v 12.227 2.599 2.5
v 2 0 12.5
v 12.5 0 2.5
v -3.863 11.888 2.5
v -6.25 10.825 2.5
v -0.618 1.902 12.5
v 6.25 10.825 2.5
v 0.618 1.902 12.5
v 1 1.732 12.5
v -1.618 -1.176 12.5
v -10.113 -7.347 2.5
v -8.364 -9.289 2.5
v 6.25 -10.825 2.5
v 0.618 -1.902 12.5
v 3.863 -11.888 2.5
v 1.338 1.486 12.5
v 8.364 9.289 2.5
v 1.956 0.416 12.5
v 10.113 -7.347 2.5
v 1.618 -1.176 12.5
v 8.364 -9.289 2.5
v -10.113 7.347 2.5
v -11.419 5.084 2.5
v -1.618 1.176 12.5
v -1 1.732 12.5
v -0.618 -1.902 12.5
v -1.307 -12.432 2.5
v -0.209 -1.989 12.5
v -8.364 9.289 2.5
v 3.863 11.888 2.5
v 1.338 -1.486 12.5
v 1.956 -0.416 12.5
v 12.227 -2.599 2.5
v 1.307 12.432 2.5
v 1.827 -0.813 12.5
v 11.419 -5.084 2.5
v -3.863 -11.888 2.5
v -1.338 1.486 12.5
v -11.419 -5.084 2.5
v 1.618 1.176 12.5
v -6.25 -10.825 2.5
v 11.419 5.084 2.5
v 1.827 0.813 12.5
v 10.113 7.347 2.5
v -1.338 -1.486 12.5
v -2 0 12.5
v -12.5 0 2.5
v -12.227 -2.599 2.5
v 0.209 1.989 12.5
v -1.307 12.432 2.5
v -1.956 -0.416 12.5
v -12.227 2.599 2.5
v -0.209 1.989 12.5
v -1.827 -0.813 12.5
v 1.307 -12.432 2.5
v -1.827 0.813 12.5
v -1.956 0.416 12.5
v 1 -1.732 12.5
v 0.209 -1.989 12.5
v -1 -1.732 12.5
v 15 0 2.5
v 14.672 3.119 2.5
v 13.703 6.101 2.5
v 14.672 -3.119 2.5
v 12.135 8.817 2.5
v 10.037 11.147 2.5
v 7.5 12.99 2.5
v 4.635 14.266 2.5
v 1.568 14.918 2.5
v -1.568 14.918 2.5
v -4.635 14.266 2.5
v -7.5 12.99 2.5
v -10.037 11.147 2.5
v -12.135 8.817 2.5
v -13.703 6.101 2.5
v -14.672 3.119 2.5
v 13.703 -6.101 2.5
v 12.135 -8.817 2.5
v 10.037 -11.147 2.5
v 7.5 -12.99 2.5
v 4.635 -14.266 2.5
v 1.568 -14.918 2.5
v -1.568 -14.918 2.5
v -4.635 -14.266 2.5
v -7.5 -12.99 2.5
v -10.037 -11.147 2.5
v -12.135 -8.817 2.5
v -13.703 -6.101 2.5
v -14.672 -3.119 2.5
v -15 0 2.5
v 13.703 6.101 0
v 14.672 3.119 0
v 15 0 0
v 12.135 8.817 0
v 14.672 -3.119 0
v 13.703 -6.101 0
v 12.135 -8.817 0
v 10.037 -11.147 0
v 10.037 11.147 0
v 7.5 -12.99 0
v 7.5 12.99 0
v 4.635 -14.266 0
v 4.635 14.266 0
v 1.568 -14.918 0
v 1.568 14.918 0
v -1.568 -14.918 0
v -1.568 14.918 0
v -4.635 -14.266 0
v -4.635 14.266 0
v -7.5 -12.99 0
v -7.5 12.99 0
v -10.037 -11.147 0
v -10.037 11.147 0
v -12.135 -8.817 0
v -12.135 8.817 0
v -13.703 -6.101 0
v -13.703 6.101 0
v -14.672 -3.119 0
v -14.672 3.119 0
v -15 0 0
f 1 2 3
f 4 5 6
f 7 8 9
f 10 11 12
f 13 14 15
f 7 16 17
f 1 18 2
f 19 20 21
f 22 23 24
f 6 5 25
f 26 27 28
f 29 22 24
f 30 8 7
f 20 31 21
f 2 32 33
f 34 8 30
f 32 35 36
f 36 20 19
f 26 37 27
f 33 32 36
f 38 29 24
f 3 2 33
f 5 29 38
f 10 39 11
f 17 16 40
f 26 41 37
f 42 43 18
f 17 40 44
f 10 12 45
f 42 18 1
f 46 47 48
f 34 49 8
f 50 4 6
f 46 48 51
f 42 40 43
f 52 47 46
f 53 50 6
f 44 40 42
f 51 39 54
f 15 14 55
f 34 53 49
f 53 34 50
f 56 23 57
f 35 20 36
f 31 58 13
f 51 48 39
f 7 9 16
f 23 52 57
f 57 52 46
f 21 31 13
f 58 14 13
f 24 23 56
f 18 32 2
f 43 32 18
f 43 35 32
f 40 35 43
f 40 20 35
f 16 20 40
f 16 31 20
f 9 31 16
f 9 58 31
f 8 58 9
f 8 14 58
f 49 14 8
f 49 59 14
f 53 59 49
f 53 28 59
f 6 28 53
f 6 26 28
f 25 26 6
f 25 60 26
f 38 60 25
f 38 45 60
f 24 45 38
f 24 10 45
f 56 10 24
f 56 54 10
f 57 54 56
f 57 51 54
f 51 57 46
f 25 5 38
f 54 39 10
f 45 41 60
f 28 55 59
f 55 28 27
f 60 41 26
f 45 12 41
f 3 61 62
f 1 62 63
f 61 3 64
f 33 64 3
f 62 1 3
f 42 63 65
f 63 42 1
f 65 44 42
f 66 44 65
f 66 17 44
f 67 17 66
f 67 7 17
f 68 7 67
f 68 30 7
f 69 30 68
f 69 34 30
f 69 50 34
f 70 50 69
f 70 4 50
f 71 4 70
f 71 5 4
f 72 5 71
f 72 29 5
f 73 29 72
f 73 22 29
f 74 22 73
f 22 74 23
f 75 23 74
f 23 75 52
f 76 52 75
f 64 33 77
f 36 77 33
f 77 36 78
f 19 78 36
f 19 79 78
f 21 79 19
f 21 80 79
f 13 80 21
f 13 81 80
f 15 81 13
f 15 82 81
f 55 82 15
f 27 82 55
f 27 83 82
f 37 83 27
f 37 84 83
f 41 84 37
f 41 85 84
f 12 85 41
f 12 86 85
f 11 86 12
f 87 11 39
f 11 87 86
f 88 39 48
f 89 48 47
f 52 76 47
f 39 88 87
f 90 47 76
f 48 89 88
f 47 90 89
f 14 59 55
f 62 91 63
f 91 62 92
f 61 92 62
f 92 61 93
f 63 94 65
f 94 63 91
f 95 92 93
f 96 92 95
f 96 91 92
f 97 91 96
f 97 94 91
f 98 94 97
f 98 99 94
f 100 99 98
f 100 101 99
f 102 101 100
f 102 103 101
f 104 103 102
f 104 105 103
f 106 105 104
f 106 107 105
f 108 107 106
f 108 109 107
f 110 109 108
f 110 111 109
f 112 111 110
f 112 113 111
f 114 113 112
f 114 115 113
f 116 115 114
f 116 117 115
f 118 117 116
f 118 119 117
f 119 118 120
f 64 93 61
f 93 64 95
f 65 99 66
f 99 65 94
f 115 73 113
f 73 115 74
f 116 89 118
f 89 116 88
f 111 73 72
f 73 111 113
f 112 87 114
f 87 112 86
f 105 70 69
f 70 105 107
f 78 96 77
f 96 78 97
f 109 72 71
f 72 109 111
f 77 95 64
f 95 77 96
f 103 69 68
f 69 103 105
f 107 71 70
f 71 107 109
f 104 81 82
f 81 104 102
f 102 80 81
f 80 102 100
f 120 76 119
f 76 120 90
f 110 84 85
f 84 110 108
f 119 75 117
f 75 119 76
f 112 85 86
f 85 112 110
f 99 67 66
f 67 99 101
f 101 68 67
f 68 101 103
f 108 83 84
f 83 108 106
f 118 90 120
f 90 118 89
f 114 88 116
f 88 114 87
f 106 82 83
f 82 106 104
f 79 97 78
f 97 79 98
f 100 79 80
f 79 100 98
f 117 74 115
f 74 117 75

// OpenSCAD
// Customizable spiked device foot
// Created by Kjell Kernen
// Date 14.1.2017

/*[Foot Parameters]*/

// of the foot in tens of mm:
base_height=25;// [0:200]

// of the foot in tens of mm:
base_overhang=25;// [0:30]

// of the spike in tens of mm:
diameter=250;      // [50:500]

// of the spike in tens of mm:
height=100;       // [50:500]

/*[Hidden]*/


union()
{
    translate([0,0,base_height/10]) cylinder(r=2, h=height/10, r1=diameter/20);	
    cylinder(r=((diameter + (base_overhang*2))/20), h=base_height/10);	
}


